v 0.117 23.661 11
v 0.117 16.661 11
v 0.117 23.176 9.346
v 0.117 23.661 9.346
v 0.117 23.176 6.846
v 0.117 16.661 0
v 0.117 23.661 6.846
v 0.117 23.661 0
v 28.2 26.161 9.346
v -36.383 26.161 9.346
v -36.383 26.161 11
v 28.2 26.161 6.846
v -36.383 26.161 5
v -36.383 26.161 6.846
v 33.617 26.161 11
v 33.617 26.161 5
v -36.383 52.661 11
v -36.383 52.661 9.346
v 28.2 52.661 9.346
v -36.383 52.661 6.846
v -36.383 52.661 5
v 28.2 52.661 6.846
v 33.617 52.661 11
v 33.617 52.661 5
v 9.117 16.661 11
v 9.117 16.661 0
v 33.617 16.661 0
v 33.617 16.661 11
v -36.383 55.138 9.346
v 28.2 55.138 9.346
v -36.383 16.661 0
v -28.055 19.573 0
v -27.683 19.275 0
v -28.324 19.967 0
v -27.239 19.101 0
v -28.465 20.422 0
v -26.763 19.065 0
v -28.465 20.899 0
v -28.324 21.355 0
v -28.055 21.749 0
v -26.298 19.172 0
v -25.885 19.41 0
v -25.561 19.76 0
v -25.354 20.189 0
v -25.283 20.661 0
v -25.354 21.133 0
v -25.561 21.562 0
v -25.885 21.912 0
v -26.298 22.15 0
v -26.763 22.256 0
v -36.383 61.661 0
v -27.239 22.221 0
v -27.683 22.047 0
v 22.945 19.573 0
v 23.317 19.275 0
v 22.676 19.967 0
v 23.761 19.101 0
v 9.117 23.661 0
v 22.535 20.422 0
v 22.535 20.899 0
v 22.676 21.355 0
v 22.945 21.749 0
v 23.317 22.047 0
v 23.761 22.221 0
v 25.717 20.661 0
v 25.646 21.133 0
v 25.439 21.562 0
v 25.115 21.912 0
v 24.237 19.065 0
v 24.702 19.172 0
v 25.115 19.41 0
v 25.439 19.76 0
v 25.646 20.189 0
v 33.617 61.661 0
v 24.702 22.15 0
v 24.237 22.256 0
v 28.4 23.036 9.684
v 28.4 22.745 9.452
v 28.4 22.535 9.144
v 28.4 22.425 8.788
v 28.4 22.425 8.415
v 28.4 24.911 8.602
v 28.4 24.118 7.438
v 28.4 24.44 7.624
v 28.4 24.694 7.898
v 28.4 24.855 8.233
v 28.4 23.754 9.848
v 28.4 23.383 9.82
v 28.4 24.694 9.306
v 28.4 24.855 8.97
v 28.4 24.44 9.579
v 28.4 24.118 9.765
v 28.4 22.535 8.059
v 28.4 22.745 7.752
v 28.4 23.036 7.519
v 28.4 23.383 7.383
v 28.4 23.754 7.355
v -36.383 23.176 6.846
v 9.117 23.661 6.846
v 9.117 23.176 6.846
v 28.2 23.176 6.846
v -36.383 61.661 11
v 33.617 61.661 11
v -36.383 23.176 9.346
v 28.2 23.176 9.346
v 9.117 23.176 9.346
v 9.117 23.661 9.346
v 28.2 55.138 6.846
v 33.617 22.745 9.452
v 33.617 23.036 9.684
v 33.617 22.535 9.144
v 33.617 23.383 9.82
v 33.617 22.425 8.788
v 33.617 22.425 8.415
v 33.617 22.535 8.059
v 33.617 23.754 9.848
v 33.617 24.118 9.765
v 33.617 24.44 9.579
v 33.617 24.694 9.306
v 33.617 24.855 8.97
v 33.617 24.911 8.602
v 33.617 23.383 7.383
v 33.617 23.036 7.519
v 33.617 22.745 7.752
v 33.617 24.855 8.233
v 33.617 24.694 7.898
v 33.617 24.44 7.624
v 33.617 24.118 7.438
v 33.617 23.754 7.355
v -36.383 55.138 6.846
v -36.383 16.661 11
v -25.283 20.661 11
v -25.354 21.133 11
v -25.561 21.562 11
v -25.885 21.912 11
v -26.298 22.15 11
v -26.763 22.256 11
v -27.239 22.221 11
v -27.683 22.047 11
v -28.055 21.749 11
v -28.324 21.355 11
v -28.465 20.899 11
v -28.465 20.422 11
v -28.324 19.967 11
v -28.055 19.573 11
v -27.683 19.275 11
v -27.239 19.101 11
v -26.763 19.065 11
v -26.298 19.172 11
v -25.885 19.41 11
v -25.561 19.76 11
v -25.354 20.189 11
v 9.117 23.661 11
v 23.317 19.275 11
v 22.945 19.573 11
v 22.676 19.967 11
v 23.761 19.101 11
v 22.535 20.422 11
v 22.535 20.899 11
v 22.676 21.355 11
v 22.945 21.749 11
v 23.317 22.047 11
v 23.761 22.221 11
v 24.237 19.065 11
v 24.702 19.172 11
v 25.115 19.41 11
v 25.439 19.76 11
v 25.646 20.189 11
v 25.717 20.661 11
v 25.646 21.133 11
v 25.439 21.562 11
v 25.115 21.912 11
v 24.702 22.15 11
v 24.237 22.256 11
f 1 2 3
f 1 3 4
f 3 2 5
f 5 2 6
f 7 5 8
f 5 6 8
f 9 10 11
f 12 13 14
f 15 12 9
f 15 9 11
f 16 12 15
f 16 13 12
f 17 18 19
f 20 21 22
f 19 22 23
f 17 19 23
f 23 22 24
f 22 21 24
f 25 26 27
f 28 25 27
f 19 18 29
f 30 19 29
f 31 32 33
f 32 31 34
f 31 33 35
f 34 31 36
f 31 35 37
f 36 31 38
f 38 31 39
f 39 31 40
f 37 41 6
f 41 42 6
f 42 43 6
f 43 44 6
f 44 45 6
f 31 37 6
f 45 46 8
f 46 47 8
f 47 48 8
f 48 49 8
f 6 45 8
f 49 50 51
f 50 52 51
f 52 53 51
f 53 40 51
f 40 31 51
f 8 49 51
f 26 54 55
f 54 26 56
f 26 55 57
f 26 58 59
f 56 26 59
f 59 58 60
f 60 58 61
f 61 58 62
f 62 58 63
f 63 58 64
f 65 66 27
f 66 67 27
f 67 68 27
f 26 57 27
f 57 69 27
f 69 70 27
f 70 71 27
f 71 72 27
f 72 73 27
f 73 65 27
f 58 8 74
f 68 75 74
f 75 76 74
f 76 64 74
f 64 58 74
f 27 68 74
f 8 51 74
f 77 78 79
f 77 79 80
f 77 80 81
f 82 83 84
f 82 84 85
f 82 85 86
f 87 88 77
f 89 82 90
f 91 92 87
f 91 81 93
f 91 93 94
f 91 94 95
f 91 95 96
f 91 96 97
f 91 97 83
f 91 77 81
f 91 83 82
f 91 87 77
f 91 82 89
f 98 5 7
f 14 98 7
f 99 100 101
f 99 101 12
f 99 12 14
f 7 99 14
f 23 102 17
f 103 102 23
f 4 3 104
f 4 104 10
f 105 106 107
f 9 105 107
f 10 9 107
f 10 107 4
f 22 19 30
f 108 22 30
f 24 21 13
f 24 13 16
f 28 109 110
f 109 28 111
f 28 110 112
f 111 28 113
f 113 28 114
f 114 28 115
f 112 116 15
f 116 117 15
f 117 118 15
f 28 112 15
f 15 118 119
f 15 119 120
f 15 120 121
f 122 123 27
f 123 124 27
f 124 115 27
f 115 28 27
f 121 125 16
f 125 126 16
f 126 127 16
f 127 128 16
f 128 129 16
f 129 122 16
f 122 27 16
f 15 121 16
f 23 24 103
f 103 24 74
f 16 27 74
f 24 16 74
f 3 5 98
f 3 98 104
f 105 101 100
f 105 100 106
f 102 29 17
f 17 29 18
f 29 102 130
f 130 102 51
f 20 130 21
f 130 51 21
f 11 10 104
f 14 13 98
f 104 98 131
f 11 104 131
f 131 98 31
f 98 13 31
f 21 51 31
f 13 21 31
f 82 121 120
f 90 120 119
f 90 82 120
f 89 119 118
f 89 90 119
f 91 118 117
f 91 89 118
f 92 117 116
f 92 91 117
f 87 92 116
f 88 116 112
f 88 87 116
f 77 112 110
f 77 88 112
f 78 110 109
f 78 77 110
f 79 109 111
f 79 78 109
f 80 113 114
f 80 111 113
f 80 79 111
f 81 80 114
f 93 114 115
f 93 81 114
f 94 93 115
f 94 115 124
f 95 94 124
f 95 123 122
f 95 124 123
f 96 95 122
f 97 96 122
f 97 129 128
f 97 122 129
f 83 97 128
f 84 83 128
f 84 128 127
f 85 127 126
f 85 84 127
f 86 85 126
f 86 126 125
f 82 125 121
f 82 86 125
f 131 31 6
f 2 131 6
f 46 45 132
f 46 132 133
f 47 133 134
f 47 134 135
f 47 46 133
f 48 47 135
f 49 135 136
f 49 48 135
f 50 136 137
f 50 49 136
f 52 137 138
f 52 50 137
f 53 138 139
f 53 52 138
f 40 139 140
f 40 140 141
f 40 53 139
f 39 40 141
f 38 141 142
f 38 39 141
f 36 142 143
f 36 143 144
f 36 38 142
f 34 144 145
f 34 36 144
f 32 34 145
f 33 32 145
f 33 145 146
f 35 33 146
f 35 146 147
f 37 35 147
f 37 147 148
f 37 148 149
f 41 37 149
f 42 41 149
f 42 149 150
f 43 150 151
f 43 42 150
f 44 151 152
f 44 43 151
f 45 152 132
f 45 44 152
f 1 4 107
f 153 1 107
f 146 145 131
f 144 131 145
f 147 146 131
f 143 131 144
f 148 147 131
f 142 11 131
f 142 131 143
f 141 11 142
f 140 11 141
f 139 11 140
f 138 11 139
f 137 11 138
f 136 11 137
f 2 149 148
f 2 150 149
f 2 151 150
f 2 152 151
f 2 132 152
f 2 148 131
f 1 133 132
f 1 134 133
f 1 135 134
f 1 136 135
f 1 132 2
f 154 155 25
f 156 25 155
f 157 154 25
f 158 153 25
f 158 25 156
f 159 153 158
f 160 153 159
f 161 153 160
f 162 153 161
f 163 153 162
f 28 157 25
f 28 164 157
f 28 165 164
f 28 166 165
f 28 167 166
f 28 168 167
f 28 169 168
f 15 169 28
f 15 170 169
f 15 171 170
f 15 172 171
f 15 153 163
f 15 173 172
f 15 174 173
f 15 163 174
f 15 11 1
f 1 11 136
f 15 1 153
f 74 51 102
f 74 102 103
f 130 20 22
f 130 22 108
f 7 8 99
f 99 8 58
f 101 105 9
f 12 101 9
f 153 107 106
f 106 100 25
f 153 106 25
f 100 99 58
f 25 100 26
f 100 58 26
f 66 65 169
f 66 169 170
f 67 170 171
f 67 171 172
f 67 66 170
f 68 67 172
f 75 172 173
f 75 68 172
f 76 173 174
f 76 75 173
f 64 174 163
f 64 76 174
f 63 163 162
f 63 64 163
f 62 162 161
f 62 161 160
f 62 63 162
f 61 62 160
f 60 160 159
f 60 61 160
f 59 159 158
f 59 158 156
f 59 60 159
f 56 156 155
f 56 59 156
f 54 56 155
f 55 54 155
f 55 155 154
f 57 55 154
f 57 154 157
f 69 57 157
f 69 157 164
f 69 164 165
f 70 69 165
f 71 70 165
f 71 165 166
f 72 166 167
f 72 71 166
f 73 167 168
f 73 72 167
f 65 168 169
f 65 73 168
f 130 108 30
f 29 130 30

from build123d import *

# Parameters (mm, degrees)
F0_R          = 1.6
F0_W          = 70
F0_H          = 9
F0_H_2        = 26.5
F1_DEPTH      = 11
F2_START      = 5
F2_DEPTH      = 6
F3_DEPTH      = 11
F4_W          = 2.5
F4_H          = 2.5
F4_W_2        = 5
F5_DEPTH      = 59.9
F5_DEPTH_BACK = 28.2
F7_START      = 28.4
F6_R          = 1.25
F7_DEPTH      = 20.7


with BuildPart() as f1:
    # F0 (on Top) → F1 (new body)
    with BuildSketch(Plane.XY):
        Polygon((33.6174106598, 26.1609371045), (-36.3825893402, 26.1609371045), (-36.3825893402, 16.6609371045), (0.1174106598, 16.6609371045), (0.1174106598, 23.6609371045), (9.1174106598, 23.6609371045), (9.1174106598, 16.6609371045), (33.6174106598, 16.6609371045), align=None)
        with Locations((-26.8825893402, 20.6609371045)):
            Circle(F0_R, mode=Mode.SUBTRACT)
        with Locations((24.1174106598, 20.6609371045)):
            Circle(F0_R, mode=Mode.SUBTRACT)
        with Locations((-1.3825893402, 57.1609371045)):
            Rectangle(F0_W, F0_H)
        with Locations((-1.3825893402, 39.4109371045)):
            Rectangle(F0_W, F0_H_2)
    extrude(amount=F1_DEPTH)

    # F0 (on Top) → F2 (cut)
    with BuildSketch(Plane.XY.offset(F2_START)):
        with Locations((-1.3825893402, 39.4109371045)):
            Rectangle(F0_W, F0_H_2)
    extrude(amount=F2_DEPTH, mode=Mode.SUBTRACT)

    # F0 (on Top) → F3 (join)
    with BuildSketch(Plane.XY):
        with Locations((-1.3825893402, 57.1609371045)):
            Rectangle(F0_W, F0_H)
    extrude(amount=F3_DEPTH)

    # F4 (on Right) → F5 (cut, two sides)
    with BuildSketch(Plane.YZ) as f5_sk:
        with Locations((53.8876638908, 8.095925469)):
            Rectangle(F4_W, F4_H)
        with Locations((25.6764949858, 8.095925469)):
            Rectangle(F4_W_2, F4_H)
    extrude(amount=-F5_DEPTH, mode=Mode.SUBTRACT)
    extrude(f5_sk.sketch, amount=F5_DEPTH_BACK, mode=Mode.SUBTRACT)

    # F6 (on Right) → F7 (cut)
    with BuildSketch(Plane.YZ.offset(F7_START)):
        with Locations((23.6609371045, 8.6017483845)):
            Circle(F6_R)
    extrude(amount=F7_DEPTH, mode=Mode.SUBTRACT)


solid = f1.part
